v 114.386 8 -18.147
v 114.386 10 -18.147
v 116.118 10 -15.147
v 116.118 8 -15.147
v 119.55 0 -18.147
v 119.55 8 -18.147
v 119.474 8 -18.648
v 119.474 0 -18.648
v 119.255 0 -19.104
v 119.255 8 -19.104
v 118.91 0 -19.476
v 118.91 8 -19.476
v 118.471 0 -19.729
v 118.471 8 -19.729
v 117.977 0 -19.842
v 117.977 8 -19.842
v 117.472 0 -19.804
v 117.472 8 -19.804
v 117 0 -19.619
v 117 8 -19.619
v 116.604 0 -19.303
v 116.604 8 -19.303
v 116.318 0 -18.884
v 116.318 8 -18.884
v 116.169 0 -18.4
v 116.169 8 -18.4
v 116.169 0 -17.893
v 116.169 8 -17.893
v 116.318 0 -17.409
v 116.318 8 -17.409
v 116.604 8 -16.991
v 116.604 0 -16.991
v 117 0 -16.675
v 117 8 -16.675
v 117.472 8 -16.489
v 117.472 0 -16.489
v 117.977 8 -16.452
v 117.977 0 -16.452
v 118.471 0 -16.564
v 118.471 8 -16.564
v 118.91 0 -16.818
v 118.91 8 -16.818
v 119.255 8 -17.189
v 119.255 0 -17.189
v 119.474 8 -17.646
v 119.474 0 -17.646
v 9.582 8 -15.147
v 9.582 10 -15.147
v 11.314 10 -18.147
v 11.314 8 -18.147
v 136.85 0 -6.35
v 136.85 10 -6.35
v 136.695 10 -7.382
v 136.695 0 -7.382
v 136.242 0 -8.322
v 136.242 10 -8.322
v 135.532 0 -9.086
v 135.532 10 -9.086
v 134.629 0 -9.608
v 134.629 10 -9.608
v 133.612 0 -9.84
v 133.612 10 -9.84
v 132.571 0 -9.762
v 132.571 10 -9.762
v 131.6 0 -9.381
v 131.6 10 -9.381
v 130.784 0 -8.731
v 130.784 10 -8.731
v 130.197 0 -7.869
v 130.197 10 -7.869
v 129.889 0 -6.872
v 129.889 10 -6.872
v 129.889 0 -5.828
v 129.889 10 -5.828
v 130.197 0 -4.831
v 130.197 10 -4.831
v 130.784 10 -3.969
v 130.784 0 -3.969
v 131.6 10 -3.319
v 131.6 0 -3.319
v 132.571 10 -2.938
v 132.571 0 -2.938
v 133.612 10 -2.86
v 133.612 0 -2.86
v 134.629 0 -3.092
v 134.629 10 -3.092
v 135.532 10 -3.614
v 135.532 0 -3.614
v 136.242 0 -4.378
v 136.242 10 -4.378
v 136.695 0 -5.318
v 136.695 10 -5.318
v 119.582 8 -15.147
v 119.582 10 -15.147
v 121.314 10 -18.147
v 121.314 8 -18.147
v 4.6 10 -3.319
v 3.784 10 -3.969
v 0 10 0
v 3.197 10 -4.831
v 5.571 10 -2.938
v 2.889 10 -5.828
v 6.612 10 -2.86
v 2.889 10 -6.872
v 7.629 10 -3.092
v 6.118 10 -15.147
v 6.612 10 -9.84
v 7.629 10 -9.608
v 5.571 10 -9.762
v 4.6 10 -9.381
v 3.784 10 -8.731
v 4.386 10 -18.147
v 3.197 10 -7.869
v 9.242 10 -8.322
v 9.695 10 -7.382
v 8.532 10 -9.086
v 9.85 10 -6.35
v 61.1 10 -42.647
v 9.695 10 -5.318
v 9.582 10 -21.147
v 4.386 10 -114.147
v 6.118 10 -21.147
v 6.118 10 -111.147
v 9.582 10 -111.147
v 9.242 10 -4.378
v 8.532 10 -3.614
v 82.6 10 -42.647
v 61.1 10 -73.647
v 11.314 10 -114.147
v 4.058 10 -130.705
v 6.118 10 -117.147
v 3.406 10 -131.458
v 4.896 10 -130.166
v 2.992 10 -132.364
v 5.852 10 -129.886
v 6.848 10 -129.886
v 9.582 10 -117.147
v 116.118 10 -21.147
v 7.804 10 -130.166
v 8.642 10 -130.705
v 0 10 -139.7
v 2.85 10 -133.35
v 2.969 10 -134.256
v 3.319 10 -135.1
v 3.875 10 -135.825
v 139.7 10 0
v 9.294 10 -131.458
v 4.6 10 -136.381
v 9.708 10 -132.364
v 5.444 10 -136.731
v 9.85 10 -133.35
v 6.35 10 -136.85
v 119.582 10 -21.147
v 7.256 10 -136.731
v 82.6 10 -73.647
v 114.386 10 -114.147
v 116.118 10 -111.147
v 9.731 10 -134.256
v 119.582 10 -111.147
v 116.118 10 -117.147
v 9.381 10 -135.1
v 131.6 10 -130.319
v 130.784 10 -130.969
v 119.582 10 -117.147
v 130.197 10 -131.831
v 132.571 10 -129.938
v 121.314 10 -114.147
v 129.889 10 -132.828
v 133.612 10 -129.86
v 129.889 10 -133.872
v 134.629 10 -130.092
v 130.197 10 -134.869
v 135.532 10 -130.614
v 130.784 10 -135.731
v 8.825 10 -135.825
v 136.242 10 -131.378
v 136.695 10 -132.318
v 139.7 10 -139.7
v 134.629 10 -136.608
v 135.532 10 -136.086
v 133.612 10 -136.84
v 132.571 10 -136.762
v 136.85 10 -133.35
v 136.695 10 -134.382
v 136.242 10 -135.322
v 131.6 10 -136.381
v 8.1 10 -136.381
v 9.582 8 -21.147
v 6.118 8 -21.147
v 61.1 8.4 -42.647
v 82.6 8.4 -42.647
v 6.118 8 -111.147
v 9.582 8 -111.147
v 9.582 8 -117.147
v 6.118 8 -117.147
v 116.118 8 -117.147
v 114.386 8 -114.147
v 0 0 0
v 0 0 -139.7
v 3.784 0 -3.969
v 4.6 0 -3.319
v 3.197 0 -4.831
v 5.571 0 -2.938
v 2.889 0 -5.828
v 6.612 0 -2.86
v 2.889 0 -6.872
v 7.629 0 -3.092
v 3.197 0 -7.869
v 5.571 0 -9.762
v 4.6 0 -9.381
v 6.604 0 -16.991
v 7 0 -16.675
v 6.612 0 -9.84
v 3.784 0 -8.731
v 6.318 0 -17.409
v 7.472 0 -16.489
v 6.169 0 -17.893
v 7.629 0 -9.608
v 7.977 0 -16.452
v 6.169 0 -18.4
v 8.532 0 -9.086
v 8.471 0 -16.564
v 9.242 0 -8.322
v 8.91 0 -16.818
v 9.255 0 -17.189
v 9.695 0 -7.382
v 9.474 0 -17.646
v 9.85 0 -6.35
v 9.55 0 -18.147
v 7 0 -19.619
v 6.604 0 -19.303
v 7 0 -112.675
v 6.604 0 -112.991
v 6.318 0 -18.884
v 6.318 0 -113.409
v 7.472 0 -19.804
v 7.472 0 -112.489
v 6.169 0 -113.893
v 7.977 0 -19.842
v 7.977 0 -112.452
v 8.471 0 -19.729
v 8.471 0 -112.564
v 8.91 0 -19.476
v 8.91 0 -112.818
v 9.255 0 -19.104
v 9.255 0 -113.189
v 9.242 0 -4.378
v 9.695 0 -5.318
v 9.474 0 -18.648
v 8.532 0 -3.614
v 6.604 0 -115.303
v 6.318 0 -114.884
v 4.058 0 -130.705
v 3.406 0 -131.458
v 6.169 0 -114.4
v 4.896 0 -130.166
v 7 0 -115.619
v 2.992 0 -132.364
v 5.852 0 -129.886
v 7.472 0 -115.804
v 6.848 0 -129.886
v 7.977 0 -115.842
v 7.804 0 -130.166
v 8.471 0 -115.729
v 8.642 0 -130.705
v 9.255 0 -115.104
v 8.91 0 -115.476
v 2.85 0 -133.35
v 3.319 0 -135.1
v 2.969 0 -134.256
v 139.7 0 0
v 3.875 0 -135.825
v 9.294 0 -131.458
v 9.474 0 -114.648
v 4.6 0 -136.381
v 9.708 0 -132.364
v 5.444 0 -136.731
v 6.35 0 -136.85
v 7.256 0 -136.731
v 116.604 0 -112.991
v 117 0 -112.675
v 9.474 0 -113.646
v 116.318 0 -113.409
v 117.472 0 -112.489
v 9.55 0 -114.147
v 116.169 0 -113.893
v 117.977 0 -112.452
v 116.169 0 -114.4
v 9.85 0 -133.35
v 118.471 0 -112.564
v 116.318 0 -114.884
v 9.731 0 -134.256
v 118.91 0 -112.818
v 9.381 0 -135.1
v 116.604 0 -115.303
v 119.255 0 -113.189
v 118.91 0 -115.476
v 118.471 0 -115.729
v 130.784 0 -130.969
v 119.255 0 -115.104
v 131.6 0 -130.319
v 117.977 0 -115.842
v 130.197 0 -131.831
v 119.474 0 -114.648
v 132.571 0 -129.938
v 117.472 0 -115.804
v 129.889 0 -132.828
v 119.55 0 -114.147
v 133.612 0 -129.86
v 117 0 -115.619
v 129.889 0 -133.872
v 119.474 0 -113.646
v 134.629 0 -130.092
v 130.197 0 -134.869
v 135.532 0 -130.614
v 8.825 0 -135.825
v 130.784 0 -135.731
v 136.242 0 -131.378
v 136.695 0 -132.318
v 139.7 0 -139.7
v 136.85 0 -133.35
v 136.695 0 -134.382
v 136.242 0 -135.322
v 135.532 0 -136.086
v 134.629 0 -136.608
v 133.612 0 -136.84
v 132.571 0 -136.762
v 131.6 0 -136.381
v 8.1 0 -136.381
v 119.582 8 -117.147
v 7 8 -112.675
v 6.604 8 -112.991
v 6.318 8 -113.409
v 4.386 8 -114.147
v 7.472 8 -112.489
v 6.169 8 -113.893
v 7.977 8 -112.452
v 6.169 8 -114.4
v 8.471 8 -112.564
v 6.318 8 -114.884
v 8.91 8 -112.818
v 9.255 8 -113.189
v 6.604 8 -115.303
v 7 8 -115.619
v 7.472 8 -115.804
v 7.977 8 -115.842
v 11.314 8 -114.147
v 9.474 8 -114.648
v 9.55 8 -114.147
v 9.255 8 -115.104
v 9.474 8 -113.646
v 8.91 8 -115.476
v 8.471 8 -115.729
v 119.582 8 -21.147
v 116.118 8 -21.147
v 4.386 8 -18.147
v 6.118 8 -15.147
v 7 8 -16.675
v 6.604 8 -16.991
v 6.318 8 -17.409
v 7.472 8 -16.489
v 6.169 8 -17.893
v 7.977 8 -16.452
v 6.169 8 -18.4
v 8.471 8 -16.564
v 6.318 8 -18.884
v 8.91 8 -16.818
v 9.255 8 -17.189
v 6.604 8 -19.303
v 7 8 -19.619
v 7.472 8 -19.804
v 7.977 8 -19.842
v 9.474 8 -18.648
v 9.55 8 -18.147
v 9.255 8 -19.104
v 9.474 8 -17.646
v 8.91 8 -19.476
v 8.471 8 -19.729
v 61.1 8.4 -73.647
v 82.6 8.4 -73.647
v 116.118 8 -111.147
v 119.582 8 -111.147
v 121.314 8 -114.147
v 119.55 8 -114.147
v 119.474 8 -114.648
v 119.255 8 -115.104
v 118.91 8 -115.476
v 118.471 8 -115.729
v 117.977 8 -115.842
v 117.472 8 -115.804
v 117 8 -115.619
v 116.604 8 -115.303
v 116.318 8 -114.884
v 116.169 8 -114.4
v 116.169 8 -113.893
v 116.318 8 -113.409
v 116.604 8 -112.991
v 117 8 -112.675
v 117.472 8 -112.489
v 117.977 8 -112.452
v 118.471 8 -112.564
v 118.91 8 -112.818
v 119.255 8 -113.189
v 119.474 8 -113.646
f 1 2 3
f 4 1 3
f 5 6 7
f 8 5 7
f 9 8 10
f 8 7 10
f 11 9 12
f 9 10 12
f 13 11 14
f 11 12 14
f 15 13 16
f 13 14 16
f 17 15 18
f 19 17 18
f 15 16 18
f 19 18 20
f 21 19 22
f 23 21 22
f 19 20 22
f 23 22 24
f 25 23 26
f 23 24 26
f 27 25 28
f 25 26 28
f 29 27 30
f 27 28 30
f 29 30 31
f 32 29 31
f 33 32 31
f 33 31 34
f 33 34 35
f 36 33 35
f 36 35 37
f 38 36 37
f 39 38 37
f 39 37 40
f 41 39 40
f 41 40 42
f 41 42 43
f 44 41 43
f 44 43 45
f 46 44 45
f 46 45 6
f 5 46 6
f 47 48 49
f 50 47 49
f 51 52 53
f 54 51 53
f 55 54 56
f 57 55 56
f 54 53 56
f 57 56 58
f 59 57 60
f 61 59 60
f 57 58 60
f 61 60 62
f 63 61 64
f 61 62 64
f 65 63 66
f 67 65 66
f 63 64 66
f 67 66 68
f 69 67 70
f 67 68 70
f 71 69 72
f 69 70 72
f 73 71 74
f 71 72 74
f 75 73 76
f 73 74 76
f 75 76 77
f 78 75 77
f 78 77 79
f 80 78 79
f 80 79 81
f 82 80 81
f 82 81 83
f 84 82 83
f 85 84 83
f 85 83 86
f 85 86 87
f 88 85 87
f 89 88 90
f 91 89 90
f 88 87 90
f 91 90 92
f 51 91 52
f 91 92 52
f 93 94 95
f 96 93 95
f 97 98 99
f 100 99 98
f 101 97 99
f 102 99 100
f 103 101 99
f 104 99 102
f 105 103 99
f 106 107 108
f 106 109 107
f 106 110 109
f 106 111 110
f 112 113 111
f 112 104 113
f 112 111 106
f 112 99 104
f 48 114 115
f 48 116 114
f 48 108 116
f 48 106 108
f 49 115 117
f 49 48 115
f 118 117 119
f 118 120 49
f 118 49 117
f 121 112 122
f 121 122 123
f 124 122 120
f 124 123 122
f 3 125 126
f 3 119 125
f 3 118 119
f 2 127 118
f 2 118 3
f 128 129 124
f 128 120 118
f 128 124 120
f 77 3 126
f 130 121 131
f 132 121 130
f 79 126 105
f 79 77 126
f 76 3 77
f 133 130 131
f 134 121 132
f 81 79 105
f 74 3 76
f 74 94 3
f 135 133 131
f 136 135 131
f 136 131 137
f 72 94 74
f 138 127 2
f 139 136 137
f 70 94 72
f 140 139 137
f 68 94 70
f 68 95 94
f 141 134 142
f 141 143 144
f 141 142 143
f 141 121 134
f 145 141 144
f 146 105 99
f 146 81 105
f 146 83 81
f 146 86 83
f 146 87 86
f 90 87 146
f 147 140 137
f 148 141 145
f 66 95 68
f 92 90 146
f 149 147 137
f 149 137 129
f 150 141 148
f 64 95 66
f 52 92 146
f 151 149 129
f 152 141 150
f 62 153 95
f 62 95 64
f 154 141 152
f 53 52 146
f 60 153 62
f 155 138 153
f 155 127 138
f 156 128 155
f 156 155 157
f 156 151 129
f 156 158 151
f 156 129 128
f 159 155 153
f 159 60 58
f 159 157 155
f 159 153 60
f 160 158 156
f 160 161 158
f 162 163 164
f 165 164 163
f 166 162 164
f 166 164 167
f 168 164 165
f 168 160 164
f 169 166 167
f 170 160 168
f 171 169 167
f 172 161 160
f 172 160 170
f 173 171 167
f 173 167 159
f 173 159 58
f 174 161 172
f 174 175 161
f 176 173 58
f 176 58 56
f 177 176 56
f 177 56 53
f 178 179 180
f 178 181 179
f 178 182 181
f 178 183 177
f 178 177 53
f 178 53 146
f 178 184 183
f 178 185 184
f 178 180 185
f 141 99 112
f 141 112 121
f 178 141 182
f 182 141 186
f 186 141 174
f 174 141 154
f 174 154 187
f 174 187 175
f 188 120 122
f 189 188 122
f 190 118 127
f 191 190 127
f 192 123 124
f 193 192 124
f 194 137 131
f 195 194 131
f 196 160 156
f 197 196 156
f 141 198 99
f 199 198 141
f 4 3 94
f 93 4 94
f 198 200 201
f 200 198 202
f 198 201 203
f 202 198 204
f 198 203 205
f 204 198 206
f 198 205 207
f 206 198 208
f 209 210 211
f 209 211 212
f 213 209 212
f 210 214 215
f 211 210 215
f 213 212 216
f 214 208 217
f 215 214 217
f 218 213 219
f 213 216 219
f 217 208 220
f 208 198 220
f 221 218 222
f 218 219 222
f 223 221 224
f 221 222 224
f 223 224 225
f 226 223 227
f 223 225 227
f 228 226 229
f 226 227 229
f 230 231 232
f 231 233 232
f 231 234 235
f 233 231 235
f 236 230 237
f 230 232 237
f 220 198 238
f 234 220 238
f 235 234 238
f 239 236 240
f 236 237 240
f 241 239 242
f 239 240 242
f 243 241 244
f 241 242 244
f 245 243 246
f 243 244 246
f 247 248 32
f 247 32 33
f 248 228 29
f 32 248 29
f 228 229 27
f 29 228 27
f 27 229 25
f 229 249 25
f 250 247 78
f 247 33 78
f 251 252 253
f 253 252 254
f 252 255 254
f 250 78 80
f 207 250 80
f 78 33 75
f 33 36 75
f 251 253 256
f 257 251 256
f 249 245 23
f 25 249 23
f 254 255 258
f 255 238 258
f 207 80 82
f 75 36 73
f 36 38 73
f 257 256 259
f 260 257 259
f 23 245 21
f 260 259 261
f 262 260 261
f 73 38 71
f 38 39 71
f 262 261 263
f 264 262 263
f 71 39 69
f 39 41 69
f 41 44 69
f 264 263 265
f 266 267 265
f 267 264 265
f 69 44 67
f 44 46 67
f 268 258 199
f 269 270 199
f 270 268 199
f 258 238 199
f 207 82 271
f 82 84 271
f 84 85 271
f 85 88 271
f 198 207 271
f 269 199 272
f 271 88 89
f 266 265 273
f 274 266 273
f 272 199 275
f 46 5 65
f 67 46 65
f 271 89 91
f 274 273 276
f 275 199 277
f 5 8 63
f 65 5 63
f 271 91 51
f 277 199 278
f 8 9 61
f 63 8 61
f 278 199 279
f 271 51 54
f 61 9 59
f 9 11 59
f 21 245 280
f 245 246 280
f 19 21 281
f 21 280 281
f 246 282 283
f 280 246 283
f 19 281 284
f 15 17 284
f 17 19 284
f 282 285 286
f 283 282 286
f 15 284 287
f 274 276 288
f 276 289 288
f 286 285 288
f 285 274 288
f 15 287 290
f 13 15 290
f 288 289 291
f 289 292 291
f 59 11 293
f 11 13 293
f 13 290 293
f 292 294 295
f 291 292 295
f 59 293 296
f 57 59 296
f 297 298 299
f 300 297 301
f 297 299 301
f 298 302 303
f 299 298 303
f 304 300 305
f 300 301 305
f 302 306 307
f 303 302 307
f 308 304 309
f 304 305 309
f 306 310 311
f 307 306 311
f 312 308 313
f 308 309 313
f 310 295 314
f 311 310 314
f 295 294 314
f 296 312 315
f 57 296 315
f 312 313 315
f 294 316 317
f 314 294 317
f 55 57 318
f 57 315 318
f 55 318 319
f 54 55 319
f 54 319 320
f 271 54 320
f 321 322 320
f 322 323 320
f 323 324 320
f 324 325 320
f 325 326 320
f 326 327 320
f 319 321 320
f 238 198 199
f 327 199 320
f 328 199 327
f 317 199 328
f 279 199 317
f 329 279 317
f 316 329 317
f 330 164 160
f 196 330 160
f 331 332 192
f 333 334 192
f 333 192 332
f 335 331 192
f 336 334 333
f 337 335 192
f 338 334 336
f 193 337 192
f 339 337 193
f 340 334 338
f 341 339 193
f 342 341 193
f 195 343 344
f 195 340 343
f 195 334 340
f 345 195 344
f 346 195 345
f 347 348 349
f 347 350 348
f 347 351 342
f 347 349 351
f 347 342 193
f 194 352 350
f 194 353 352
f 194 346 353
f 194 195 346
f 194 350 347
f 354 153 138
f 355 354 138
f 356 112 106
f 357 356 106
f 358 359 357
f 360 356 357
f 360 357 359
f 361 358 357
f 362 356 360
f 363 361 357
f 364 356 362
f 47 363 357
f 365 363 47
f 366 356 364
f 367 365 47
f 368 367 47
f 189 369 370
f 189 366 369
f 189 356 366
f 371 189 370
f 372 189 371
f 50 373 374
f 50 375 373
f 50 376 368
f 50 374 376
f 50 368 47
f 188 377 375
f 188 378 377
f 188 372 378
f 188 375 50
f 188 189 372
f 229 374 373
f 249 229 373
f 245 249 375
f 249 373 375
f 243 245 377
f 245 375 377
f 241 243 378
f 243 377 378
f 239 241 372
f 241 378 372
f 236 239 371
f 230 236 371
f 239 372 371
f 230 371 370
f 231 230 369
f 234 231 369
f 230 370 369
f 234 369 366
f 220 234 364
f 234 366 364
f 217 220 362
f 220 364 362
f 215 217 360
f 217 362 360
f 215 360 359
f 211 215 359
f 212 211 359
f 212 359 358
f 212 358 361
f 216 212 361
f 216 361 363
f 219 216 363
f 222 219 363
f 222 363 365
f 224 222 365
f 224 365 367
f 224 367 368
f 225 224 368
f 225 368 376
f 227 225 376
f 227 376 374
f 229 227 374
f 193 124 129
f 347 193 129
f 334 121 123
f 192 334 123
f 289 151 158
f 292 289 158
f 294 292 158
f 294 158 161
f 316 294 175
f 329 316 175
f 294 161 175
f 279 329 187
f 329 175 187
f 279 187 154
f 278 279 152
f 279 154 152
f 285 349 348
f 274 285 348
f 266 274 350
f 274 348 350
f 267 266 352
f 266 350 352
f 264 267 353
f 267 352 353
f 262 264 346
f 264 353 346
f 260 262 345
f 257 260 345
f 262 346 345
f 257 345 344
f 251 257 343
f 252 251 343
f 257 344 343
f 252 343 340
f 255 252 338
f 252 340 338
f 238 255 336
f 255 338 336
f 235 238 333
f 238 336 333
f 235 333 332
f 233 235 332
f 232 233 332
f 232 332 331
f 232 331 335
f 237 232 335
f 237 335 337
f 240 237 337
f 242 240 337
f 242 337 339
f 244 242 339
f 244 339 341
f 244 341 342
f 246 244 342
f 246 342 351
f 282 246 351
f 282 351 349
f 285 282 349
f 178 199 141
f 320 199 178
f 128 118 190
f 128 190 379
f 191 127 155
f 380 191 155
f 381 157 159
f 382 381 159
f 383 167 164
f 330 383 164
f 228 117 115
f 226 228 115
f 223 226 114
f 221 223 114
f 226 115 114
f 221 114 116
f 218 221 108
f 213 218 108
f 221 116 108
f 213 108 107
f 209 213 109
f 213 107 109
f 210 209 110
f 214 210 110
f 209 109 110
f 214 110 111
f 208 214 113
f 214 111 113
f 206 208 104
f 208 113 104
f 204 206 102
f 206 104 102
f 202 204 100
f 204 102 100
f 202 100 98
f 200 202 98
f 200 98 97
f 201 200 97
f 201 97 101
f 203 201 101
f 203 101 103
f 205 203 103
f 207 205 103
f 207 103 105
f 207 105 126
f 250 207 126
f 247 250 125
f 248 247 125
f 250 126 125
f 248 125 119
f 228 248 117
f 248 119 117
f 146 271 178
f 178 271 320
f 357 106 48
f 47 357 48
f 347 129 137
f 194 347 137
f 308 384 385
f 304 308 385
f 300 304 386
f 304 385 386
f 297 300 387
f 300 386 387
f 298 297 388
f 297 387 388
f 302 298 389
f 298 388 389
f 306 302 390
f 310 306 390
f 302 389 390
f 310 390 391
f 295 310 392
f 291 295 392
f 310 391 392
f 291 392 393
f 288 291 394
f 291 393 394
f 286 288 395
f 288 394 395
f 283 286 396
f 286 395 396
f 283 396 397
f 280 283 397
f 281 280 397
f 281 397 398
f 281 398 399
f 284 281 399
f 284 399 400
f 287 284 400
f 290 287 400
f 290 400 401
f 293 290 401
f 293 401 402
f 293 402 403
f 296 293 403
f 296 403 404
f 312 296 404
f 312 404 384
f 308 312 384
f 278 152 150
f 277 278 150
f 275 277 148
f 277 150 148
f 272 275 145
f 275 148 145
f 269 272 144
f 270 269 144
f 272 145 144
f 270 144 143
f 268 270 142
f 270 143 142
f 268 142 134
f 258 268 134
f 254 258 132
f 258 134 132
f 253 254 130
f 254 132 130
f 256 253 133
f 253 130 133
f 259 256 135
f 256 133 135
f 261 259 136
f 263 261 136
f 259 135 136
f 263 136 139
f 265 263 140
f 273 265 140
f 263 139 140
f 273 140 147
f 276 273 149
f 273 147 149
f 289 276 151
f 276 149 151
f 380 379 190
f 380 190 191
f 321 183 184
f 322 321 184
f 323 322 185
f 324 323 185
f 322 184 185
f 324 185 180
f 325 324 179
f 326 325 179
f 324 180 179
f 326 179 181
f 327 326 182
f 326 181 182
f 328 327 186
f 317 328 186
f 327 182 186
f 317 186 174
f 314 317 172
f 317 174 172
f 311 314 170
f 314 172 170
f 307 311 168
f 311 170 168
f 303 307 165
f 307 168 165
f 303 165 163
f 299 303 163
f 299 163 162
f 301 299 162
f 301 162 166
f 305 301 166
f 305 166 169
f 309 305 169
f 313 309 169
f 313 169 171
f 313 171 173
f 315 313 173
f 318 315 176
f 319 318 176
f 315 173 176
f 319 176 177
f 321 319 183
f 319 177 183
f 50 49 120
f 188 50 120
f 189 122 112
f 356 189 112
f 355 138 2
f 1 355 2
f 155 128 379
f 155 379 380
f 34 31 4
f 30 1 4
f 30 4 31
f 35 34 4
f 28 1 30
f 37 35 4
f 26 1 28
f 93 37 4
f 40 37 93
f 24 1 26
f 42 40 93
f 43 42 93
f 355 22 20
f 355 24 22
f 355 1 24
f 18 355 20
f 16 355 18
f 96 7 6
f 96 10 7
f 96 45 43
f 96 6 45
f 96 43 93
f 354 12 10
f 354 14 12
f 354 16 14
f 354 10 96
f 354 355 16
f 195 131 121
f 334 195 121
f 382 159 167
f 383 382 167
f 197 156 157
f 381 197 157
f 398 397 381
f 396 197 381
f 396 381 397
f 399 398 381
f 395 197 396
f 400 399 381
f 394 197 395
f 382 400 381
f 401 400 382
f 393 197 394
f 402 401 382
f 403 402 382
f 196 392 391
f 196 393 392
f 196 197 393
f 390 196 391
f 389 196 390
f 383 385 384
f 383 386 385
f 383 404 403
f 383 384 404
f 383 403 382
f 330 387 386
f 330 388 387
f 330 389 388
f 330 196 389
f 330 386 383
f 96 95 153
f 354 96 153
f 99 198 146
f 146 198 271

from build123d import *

# Parameters (mm, degrees)
SKETCH2_W           = 139.7
SKETCH2_H           = 139.7
BOSS_EXTRUDE1_DEPTH = 10
SKETCH1_R           = 3.5
CUT_EXTRUDE1_DEPTH  = 10
SKETCH3_W           = 21.5
SKETCH3_H           = 31
CUT_EXTRUDE2_DEPTH  = 1.6
SKETCH4_R           = 1.7
CUT_EXTRUDE3_DEPTH  = 10
CUT_EXTRUDE4_DEPTH  = 2


with BuildPart() as part:
    # Sketch2 → Boss-Extrude1 (new body)
    with BuildSketch(Plane(origin=(0, 0, 0), x_dir=(1, 0, 0), z_dir=(0, 1, 0))):
        with Locations((69.85, 69.85)):
            Rectangle(SKETCH2_W, SKETCH2_H)
    extrude(amount=BOSS_EXTRUDE1_DEPTH)

    # Sketch1 → Cut-Extrude1 (cut)
    with BuildSketch(Plane(origin=(0, 10, 0), x_dir=(1, 0, 0), z_dir=(0, 1, 0))):
        with BuildLine():
            Line((6.35, 136.85), (6.35, 133.35))
            Line((6.35, 133.35), (2.85, 133.35))
            ThreePointArc((2.85, 133.35), (6.35, 129.85), (9.85, 133.35))
            ThreePointArc((9.85, 133.35), (8.824873734, 135.824873734), (6.35, 136.85))
        make_face()
        with BuildLine():
            Line((2.85, 133.35), (6.35, 133.35))
            Line((6.35, 133.35), (6.35, 136.85))
            ThreePointArc((6.35, 136.85), (3.875126266, 135.824873734), (2.85, 133.35))
        make_face()
        with Locations((133.35, 133.35)):
            Circle(SKETCH1_R)
        with Locations((6.35, 6.35)):
            Circle(SKETCH1_R)
        with Locations((133.35, 6.35)):
            Circle(SKETCH1_R)
    extrude(amount=-CUT_EXTRUDE1_DEPTH, mode=Mode.SUBTRACT)

    # Sketch3 → Cut-Extrude2 (cut)
    with BuildSketch(Plane(origin=(0, 10, 0), x_dir=(1, 0, 0), z_dir=(0, 1, 0))):
        with Locations((71.85, 58.1468)):
            Rectangle(SKETCH3_W, SKETCH3_H)
    extrude(amount=-CUT_EXTRUDE2_DEPTH, mode=Mode.SUBTRACT)

    # Sketch4 → Cut-Extrude3 (cut)
    with BuildSketch(Plane(origin=(0, 10, 0), x_dir=(1, 0, 0), z_dir=(0, 1, 0))):
        with Locations((7.85, 114.1468)):
            Circle(SKETCH4_R)
        with Locations((7.85, 18.1468)):
            Circle(SKETCH4_R)
        with Locations((117.85, 114.1468)):
            Circle(SKETCH4_R)
        with Locations((117.85, 18.1468)):
            Circle(SKETCH4_R)
    extrude(amount=-CUT_EXTRUDE3_DEPTH, mode=Mode.SUBTRACT)

    # Sketch5 → Cut-Extrude4 (cut)
    with BuildSketch(Plane(origin=(0, 10, 0), x_dir=(1, 0, 0), z_dir=(0, 1, 0))):
        Polygon((9.582050808, 111.1468), (11.314101615, 114.1468), (9.582050808, 117.1468), (6.117949192, 117.1468), (4.385898385, 114.1468), (6.117949192, 111.1468), align=None)
        Polygon((9.582050808, 15.1468), (11.314101615, 18.1468), (9.582050808, 21.1468), (6.117949192, 21.1468), (4.385898385, 18.1468), (6.117949192, 15.1468), align=None)
        Polygon((119.582050808, 111.1468), (121.314101615, 114.1468), (119.582050808, 117.1468), (116.117949192, 117.1468), (114.385898385, 114.1468), (116.117949192, 111.1468), align=None)
        Polygon((119.582050808, 15.1468), (121.314101615, 18.1468), (119.582050808, 21.1468), (116.117949192, 21.1468), (114.385898385, 18.1468), (116.117949192, 15.1468), align=None)
    extrude(amount=-CUT_EXTRUDE4_DEPTH, mode=Mode.SUBTRACT)


solid = part.part
